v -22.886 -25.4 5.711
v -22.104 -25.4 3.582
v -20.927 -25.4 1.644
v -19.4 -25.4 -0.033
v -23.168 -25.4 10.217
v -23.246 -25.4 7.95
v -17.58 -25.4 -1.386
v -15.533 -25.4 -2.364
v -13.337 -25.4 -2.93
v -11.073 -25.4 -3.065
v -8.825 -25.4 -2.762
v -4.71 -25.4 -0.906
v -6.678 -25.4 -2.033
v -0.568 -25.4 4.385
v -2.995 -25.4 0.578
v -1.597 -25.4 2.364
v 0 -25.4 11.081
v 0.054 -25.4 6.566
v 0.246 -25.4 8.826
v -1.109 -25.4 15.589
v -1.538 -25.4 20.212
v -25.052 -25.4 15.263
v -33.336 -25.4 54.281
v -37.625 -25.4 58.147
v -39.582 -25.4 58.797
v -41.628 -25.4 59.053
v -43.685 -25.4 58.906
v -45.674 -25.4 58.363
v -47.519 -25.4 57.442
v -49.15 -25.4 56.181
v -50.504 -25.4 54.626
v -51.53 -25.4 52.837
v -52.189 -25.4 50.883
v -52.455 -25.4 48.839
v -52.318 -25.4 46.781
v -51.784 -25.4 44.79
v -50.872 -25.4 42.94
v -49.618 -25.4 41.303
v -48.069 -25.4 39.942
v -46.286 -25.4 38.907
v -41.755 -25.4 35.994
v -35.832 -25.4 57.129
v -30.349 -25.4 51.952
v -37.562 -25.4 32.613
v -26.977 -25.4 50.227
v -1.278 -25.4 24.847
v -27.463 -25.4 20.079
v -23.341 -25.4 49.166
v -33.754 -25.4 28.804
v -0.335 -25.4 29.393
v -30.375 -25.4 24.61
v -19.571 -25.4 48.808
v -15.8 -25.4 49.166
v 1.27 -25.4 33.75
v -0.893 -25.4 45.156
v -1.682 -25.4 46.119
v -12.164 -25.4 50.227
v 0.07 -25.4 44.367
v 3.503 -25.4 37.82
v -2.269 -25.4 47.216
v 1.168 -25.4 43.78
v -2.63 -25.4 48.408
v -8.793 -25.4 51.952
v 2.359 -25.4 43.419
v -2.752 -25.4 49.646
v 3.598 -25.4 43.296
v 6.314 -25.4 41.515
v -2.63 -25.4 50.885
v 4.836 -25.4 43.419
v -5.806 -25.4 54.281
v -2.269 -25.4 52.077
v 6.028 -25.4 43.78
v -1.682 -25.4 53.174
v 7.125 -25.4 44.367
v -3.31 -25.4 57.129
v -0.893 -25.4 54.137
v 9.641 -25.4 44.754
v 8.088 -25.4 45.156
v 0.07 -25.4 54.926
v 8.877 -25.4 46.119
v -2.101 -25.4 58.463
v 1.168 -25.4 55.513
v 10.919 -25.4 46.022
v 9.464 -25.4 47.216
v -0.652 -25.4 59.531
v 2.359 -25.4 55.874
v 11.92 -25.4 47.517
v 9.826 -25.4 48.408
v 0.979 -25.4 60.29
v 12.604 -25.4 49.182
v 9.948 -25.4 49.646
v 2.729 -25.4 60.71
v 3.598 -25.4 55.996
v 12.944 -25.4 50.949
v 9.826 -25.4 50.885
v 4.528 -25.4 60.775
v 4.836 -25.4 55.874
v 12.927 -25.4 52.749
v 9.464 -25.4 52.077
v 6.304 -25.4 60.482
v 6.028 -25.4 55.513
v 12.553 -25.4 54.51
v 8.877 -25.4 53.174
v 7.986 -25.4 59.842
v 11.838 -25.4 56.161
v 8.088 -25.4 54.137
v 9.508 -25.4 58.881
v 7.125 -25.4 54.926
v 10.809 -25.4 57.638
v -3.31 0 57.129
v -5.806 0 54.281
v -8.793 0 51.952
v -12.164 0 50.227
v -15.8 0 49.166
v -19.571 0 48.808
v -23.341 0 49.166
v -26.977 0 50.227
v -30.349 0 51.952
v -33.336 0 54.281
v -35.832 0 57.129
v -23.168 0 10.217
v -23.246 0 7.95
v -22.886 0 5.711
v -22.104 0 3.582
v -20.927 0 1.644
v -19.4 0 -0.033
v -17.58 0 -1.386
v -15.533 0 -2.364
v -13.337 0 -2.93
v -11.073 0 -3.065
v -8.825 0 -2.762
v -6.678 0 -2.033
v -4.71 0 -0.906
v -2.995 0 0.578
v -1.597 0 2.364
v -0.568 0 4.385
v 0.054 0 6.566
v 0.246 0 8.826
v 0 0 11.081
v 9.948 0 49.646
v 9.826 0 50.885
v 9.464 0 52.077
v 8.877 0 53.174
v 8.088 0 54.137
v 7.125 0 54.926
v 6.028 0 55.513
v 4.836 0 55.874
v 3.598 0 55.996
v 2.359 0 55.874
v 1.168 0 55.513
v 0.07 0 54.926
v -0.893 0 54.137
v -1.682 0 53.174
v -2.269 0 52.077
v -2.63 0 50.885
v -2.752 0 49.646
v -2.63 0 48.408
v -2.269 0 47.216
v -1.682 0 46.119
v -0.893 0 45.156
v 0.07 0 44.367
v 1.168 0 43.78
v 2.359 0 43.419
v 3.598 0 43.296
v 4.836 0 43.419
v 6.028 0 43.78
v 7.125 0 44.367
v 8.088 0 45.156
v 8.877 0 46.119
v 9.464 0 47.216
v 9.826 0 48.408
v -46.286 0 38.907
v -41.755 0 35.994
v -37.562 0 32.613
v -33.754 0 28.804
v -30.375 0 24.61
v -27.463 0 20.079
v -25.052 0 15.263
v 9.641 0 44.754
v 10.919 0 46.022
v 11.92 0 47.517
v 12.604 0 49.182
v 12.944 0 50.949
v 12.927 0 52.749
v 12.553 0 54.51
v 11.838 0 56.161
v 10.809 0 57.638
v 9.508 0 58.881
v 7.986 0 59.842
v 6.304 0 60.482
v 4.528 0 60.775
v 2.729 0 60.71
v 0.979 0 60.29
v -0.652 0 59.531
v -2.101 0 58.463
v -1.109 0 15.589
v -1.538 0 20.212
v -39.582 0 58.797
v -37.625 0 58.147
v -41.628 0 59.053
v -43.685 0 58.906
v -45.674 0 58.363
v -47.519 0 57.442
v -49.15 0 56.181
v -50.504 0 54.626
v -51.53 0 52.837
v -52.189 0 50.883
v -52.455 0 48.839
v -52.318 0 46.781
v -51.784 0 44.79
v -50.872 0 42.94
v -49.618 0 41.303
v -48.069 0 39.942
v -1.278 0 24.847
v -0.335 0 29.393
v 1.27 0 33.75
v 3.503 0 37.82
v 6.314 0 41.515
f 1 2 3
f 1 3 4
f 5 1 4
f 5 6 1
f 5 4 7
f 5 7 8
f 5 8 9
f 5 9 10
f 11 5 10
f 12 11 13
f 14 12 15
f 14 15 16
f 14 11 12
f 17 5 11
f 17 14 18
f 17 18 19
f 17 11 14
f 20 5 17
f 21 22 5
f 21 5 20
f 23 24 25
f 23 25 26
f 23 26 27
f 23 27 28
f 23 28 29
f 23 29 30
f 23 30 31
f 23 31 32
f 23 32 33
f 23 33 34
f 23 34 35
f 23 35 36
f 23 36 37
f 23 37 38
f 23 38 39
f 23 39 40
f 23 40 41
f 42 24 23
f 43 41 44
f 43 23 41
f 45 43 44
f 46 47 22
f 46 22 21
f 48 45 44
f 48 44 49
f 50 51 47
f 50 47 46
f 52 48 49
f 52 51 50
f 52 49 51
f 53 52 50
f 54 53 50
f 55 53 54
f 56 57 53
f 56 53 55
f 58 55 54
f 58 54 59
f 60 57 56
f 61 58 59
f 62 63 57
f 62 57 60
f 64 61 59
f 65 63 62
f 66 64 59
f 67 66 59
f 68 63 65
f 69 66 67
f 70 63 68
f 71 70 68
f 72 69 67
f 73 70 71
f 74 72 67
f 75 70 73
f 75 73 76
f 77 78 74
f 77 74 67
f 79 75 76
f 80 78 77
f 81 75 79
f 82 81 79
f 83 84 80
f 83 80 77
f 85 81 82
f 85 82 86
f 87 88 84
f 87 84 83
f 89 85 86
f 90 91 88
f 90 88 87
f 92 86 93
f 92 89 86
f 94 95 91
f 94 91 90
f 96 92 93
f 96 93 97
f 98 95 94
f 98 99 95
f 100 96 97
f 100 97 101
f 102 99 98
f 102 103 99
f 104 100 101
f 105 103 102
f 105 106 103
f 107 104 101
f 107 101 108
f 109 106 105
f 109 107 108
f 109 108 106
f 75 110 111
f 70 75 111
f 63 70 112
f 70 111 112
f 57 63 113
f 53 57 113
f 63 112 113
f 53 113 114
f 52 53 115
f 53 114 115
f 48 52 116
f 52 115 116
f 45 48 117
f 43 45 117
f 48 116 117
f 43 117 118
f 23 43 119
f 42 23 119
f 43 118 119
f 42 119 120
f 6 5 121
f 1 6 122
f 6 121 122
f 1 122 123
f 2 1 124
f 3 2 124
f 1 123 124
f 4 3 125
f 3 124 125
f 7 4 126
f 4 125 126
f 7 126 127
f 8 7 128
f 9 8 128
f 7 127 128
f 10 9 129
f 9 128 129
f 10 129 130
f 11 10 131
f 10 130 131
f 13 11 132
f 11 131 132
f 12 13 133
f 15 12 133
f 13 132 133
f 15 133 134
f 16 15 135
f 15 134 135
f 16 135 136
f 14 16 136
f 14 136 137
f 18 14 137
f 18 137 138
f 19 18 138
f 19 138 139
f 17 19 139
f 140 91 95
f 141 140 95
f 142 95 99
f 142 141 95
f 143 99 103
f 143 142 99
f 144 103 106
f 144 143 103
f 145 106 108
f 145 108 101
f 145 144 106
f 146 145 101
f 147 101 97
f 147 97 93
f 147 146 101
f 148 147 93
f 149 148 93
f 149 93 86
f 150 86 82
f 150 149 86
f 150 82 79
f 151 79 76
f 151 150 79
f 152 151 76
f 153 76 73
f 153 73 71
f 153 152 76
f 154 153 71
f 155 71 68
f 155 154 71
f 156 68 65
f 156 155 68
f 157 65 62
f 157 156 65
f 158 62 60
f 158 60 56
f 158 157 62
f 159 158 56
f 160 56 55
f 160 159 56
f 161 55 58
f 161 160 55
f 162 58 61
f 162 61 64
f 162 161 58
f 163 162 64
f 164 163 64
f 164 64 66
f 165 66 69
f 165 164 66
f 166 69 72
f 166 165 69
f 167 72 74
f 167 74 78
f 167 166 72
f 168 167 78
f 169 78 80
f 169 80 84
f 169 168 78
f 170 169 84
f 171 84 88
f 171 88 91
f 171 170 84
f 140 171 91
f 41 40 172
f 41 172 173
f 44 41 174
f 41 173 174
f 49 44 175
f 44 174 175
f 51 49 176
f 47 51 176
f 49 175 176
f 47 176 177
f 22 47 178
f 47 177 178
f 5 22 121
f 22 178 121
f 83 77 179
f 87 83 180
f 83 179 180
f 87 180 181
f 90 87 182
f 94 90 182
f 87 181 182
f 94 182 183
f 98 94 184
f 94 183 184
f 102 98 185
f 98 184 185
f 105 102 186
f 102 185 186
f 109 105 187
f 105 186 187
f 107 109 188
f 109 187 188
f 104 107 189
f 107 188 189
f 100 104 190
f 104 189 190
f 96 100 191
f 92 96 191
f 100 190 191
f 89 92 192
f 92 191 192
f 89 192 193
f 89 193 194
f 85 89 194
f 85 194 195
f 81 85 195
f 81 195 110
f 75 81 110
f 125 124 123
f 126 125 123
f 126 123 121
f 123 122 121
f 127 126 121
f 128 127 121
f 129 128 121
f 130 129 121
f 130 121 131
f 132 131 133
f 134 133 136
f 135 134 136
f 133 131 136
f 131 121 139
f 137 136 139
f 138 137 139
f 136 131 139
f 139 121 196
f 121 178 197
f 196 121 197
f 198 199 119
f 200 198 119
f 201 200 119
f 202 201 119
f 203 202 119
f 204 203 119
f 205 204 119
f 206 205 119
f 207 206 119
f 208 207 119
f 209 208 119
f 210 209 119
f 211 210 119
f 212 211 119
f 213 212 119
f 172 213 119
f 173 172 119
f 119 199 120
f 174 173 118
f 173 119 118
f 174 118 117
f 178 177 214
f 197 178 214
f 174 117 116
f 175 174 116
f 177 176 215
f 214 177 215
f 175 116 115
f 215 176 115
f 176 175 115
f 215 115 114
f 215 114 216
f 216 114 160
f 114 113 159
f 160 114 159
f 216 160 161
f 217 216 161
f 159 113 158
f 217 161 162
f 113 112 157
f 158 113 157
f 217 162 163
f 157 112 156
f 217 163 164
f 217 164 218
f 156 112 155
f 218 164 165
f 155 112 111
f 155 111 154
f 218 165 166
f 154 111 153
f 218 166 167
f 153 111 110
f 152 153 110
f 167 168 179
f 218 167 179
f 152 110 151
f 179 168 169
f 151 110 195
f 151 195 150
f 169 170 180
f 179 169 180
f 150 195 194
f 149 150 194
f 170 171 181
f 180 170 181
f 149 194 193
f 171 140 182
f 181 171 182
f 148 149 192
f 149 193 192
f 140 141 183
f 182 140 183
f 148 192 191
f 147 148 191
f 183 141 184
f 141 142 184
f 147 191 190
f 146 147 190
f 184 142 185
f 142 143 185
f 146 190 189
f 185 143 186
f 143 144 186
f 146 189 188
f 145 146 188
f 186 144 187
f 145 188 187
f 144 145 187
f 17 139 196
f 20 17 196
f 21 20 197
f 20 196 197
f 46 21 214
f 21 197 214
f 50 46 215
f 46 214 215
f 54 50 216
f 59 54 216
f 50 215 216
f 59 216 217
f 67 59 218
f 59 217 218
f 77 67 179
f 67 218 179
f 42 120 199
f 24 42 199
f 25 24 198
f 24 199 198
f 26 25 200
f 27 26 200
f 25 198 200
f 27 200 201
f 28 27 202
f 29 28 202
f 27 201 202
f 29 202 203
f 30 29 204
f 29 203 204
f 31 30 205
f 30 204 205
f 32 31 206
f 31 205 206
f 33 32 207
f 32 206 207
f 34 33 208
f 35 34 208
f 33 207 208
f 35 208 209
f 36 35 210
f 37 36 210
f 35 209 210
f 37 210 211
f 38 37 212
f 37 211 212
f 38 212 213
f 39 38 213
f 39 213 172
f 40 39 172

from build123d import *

# Parameters (mm, degrees)
F2_DEPTH = 25.4
F1_R     = 6.35
F3_DEPTH = 25.4
F4_DEPTH = 25.4


with BuildPart() as f2:
    # F0 (on Front) → F2 (new body)
    with BuildSketch(Plane.XZ):
        with BuildLine():
            ThreePointArc((-3.309767, 57.129443), (-19.570792, 48.808365), (-35.831816, 57.129443))
            ThreePointArc((-35.831816, 57.129443), (-51.061196, 53.756689), (-46.285682, 38.907315))
            ThreePointArc((-46.285682, 38.907315), (-32.008572, 26.752618), (-23.168363, 10.217104))
            ThreePointArc((-23.168363, 10.217104), (-11.073118, -3.064714), (0, 11.080521))
            ThreePointArc((0, 11.080521), (-0.335296, 29.39346), (9.641493, 44.753794))
            ThreePointArc((9.641493, 44.753794), (10.189797, 58.292246), (-3.309767, 57.129443))
        make_face()
    extrude(amount=F2_DEPTH)

    # F1 (on Front) → F3 (cut)
    with BuildSketch(Plane.XZ):
        with Locations((3.597573, 49.646493)):
            Circle(F1_R)
    extrude(amount=F3_DEPTH, mode=Mode.SUBTRACT)

    # F1 (on Front) → F4 (cut)
    with BuildSketch(Plane.XZ):
        with Locations((-41.875739, 48.49527)):
            Circle(F1_R)
    extrude(amount=-F4_DEPTH, mode=Mode.SUBTRACT)


solid = f2.part
